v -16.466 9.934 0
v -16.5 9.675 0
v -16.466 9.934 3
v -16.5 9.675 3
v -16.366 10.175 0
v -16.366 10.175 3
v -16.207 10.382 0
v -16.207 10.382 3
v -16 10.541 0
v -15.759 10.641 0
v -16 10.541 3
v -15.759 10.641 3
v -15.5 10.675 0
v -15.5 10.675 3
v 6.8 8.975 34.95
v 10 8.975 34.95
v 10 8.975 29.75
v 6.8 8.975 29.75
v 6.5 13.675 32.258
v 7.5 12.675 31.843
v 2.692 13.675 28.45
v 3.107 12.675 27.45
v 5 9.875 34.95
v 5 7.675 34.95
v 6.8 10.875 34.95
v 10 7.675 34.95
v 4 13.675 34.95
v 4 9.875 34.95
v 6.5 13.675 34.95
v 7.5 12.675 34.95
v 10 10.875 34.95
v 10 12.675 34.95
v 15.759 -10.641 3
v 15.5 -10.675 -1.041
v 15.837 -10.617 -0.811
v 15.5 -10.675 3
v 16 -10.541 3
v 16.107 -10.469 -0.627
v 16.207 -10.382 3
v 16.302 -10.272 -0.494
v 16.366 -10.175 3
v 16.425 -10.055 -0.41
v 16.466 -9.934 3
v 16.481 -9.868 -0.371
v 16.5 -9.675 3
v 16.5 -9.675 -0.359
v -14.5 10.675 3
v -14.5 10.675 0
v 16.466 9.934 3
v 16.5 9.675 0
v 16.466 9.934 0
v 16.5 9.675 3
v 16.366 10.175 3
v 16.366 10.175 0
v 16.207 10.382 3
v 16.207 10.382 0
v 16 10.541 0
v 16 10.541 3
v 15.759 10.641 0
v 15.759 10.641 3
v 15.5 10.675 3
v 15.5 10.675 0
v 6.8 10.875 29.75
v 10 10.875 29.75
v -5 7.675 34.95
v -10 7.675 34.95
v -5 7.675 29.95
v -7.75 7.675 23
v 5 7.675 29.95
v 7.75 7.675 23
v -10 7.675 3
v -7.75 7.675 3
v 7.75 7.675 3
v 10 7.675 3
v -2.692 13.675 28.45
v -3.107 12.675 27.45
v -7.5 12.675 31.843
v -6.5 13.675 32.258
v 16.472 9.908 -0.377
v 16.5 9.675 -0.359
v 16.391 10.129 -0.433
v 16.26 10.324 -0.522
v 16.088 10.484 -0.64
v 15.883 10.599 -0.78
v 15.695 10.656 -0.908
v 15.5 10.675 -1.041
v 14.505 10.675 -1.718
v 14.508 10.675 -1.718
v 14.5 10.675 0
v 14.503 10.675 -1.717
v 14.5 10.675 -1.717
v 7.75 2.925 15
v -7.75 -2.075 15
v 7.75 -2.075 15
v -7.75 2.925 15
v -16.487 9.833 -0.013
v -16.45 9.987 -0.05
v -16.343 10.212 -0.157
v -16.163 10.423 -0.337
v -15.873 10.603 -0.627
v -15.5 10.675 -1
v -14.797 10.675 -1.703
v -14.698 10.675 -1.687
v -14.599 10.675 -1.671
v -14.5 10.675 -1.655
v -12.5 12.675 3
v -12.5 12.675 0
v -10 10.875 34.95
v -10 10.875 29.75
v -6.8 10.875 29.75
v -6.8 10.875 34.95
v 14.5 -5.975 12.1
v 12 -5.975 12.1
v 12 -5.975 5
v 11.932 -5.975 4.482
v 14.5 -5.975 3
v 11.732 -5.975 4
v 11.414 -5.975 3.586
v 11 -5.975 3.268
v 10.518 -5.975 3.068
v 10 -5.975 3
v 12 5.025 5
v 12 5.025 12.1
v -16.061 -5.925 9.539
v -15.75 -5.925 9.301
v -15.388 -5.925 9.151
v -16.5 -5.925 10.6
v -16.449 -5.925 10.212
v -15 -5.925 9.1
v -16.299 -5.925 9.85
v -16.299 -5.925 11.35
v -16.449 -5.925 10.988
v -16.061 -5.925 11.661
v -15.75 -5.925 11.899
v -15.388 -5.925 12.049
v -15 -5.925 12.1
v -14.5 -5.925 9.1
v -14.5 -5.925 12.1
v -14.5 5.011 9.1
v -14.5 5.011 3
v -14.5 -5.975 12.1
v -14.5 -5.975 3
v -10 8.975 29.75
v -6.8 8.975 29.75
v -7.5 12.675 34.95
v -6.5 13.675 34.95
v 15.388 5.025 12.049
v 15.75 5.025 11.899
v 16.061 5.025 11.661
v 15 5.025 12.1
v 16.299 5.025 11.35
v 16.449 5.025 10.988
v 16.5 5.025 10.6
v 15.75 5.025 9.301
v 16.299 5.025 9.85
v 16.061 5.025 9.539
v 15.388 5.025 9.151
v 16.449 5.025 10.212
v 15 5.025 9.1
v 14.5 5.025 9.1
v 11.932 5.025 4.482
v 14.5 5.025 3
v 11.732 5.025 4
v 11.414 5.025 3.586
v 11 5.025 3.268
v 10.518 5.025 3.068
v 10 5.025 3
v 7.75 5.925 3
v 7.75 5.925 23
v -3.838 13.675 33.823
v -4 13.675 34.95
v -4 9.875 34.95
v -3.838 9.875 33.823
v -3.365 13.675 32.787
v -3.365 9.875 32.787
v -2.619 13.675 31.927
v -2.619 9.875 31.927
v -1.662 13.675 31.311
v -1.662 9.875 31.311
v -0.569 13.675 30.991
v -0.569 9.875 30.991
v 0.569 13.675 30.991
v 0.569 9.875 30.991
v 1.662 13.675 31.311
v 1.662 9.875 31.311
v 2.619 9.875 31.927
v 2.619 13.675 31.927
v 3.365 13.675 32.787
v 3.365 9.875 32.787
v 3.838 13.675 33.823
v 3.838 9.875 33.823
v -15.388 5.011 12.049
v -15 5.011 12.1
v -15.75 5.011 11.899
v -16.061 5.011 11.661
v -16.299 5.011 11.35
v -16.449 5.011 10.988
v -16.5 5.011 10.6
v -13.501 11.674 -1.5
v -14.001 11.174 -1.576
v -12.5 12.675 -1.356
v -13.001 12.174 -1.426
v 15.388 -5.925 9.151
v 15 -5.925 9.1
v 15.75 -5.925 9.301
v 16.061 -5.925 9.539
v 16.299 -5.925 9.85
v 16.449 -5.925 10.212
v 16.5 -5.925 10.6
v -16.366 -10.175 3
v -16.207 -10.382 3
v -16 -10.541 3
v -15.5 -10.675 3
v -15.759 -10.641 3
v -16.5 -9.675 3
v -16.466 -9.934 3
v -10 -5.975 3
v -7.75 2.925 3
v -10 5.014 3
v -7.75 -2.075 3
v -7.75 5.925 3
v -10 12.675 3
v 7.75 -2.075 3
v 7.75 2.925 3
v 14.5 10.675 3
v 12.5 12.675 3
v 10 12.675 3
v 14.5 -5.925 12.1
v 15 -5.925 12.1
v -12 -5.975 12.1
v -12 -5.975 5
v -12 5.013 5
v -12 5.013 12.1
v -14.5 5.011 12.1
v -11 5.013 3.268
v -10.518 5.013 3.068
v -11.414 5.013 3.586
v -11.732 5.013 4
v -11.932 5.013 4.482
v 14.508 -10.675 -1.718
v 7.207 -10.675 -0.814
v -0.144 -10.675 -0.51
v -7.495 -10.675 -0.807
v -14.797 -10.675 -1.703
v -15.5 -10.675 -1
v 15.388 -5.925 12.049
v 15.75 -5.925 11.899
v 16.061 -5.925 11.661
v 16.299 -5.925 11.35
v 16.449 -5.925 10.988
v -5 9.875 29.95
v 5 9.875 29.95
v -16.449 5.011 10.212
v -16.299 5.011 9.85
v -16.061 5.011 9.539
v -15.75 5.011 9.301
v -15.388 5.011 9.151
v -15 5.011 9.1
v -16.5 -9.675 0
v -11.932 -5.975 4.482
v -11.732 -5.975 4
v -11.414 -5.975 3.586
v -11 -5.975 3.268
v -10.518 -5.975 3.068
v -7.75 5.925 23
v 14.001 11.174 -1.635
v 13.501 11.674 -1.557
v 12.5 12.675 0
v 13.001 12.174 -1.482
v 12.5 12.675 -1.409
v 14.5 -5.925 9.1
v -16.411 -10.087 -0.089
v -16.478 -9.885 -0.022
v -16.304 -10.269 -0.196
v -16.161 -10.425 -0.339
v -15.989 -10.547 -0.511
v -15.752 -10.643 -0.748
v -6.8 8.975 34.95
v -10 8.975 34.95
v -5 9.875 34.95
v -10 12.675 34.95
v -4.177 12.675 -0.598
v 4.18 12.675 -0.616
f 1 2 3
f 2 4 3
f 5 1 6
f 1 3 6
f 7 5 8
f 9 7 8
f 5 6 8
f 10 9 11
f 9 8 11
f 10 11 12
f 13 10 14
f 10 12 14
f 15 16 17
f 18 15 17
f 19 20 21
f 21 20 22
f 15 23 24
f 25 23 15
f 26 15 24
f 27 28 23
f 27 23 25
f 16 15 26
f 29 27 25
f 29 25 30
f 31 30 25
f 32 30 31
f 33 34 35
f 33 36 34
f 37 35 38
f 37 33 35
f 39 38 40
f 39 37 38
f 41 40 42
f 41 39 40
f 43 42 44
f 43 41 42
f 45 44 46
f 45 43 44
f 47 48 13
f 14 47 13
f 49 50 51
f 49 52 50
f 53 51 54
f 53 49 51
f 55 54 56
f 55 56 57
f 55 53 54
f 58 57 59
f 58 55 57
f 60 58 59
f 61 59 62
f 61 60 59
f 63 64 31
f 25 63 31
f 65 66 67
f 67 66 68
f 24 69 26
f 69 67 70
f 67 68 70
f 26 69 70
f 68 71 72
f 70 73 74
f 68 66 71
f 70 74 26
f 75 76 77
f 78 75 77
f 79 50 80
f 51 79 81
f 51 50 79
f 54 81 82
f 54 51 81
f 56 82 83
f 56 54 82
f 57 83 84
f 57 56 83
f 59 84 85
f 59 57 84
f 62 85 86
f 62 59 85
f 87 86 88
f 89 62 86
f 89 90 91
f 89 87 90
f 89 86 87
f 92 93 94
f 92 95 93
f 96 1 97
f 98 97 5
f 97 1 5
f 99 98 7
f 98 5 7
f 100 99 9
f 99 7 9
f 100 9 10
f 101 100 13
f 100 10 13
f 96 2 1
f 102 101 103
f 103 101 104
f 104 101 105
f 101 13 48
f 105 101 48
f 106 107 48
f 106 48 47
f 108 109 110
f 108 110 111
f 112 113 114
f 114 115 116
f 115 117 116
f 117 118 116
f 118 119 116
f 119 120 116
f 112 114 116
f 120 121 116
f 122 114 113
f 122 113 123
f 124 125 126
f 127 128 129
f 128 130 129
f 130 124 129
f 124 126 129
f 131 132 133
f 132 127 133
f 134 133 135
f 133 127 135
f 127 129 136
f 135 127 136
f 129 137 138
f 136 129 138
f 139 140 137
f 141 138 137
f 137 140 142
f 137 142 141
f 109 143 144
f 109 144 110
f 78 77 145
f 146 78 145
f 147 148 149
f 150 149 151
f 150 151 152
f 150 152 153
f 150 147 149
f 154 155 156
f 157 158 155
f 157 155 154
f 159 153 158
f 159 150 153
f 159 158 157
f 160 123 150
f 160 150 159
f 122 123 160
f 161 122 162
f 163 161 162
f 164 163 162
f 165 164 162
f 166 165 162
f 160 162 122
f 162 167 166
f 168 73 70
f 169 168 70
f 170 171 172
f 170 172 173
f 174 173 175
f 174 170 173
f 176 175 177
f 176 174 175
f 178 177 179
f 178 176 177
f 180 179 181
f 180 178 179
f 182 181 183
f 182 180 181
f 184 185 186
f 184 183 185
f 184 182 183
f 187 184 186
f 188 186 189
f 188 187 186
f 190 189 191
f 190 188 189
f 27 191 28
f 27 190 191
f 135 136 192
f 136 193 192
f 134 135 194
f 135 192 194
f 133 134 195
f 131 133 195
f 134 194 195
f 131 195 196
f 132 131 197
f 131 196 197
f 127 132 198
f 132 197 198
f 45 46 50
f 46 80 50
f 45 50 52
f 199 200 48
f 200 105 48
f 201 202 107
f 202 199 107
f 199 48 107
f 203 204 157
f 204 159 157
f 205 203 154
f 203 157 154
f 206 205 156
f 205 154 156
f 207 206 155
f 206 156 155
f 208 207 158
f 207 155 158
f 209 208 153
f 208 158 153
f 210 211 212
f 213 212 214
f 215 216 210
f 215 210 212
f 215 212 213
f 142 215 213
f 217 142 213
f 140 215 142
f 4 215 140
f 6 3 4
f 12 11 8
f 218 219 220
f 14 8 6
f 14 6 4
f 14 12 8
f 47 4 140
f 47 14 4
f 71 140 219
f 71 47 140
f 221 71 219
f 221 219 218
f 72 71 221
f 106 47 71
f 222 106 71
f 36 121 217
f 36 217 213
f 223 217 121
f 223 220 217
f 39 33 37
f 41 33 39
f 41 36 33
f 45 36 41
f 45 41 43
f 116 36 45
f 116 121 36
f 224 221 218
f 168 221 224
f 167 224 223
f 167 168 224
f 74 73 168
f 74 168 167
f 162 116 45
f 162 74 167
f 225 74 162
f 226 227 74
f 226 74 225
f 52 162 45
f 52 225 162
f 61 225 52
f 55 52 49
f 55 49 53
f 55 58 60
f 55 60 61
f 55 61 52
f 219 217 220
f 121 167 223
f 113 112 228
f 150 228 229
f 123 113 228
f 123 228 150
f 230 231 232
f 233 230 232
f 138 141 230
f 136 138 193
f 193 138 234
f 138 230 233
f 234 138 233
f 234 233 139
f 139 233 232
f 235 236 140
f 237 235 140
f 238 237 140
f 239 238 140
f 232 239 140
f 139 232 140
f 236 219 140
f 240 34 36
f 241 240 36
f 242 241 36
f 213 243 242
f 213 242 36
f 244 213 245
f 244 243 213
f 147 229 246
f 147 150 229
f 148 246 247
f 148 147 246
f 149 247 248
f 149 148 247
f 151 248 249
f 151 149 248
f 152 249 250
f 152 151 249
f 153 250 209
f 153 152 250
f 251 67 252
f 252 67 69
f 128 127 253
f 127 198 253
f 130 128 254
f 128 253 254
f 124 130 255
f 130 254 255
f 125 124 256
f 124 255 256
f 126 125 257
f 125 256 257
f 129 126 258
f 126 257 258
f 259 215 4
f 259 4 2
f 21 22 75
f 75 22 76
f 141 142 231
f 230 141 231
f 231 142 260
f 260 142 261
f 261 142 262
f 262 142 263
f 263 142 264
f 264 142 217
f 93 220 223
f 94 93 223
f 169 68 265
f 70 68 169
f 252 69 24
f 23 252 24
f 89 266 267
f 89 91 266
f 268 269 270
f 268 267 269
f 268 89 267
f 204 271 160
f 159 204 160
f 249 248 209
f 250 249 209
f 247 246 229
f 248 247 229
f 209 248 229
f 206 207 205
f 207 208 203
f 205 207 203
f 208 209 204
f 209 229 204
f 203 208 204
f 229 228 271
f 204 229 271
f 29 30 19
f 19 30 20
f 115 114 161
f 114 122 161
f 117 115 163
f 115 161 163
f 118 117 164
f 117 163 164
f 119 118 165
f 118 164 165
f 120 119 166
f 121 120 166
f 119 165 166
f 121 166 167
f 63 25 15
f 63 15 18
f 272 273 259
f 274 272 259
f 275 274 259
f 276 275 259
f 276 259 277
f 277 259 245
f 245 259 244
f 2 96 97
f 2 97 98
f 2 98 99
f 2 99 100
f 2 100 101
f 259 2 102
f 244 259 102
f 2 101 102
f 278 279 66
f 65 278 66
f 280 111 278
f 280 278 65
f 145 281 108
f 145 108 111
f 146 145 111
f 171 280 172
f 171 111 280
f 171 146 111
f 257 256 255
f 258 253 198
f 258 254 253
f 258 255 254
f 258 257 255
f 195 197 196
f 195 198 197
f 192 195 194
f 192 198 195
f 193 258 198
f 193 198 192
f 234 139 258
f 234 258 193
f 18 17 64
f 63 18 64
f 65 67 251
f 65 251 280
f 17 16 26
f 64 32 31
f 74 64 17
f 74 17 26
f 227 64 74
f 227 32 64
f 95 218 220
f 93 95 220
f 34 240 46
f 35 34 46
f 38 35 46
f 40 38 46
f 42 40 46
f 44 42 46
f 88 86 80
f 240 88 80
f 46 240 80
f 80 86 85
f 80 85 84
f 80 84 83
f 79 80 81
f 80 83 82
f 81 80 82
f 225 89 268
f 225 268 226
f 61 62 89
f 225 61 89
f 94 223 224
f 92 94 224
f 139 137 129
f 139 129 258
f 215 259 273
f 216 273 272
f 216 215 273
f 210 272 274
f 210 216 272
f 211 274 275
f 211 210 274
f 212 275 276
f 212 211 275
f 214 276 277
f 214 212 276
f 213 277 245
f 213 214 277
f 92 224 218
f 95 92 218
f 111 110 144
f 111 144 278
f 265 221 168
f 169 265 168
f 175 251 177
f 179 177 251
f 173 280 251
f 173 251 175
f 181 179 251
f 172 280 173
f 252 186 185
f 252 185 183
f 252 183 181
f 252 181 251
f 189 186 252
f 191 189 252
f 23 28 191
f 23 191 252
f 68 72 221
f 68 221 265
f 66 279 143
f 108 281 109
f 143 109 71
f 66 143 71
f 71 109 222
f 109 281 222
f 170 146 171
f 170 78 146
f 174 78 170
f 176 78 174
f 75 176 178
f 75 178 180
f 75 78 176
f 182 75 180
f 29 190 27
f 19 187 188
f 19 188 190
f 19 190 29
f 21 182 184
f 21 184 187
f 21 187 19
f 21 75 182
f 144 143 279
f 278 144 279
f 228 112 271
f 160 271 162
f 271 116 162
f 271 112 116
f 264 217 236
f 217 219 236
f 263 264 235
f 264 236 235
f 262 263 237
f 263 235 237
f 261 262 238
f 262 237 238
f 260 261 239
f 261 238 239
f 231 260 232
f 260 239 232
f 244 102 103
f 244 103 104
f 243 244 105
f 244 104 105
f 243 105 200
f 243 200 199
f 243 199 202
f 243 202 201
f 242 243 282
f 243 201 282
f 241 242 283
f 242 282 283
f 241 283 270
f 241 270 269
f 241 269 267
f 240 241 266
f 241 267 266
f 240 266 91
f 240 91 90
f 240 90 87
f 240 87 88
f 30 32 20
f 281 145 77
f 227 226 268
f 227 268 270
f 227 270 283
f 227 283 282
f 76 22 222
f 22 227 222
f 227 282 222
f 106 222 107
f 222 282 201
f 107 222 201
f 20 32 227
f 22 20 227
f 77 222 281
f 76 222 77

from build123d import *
from build123d.topology import SkipClean

# Parameters (mm, degrees)
BOSS_EXTRUDE1_DEPTH = 3
SKETCH2_W           = 2.5
SKETCH2_H           = 11
BOSS_EXTRUDE2_DEPTH = 9.1
SKETCH3_W           = 3
SKETCH3_H           = 10.936372413
BOSS_EXTRUDE3_DEPTH = 2
SKETCH4_W           = 3
SKETCH4_H           = 10.95
BOSS_EXTRUDE4_DEPTH = 2
FILLET2_R           = 1.5
FILLET3_R           = 2
SKETCH6_W           = 20
SKETCH6_H           = 31.95
BOSS_EXTRUDE5_DEPTH = 5
CUT_EXTRUDE1_REACH  = 47.155
BOSS_EXTRUDE6_START = 1
BOSS_EXTRUDE6_DEPTH = 1
CHAMFER1_SIZE       = 1
SKETCH10_W          = 15.5
SKETCH10_H          = 20
BOSS_EXTRUDE7_DEPTH = 1.75
BOSS_EXTRUDE8_DEPTH = 12
BOSS_EXTRUDE9_DEPTH = 23.35
CHAMFER3_SIZE       = 1.7121869
CHAMFER3_SIZE_2     = 2
FILLET4_R           = 1
CHAMFER4_SIZE       = 2
CUT_EXTRUDE2_DEPTH  = 41.997050199
CUT_EXTRUDE3_DEPTH  = 3.2
SKETCH15_W          = 5.2
SKETCH15_H          = 1.9
CUT_EXTRUDE4_DEPTH  = 3.2
SKETCH16_W          = 10
SKETCH16_H          = 5
CUT_EXTRUDE5_DEPTH  = 2.2


# Some blends are built 0.0001 mm under size
with BuildPart() as part:
    # Sketch1 → Boss-Extrude1 (new body)
    with BuildSketch(Plane.XY):
        Polygon((14.5, 12.675), (-14.5, 12.675), (-14.5, 10.675), (-16.5, 10.675), (-16.5, -10.675), (16.5, -10.675), (16.5, 10.675), (14.5, 10.675), align=None)
    extrude(amount=BOSS_EXTRUDE1_DEPTH)

    # Sketch2 → Boss-Extrude2 (add)
    with BuildSketch(Plane.XY.offset(3)):
        with Locations((13.25, -0.475)):
            Rectangle(SKETCH2_W, SKETCH2_H)
        Polygon((-14.5, 5.011372413), (-14.5, -5.975), (-12, -5.975), (-12, 5.012658035), align=None)
    extrude(amount=BOSS_EXTRUDE2_DEPTH)

    # Sketch3 → Boss-Extrude3 (add)
    with BuildSketch(Plane.ZY.offset(14.5)):
        with Locations((10.6, -0.456813794)):
            Rectangle(SKETCH3_W, SKETCH3_H)
    extrude(amount=BOSS_EXTRUDE3_DEPTH)

    # Sketch4 → Boss-Extrude4 (add)
    with BuildSketch(Plane(origin=(14.5, 0, 0), x_dir=(0, 0, -1), z_dir=(1, 0, 0))):
        with Locations((-10.6, -0.45)):
            Rectangle(SKETCH4_W, SKETCH4_H)
    extrude(amount=BOSS_EXTRUDE4_DEPTH)

    # Fillet2
    fillet2_edges = [part.edges().sort_by_distance(p)[0] for p in [
        (-16.5, -0.456813793, 9.1),
        (-16.5, -0.456813793, 12.1),
        (16.5, -0.45, 9.1),
        (16.5, -0.45, 12.1),
    ]]
    fillet(fillet2_edges, radius=FILLET2_R - 0.0001)  # a hair under: the kernel refuses the full size

    # Fillet3
    fillet3_edges = [part.edges().sort_by_distance(p)[0] for p in [
        (12, -0.475, 3),
        (-12, -0.481170983, 3),
    ]]
    fillet(fillet3_edges, radius=FILLET3_R)

    # Sketch6 → Boss-Extrude5 (add)
    with BuildSketch(Plane(origin=(0, 12.675, 0), x_dir=(1, 0, 0), z_dir=(0, 1, 0))):
        with Locations((0, -18.975)):
            Rectangle(SKETCH6_W, SKETCH6_H)
    extrude(amount=-BOSS_EXTRUDE5_DEPTH)

    # Sketch7 → Cut-Extrude1 (cut, up to next)
    with BuildSketch(Plane(origin=(0, 12.675, 0), x_dir=(1, 0, 0), z_dir=(0, 1, 0)), mode=Mode.PRIVATE) as cut_extrude1_sk1:
        with BuildLine():
            Line((-4, -34.95), (4, -34.95))
            ThreePointArc((4, -34.95), (0, -30.95), (-4, -34.95))
        make_face()
    cut_extrude1_tool1 = extrude(cut_extrude1_sk1.sketch, amount=-CUT_EXTRUDE1_REACH, mode=Mode.PRIVATE) & part.part
    add(cut_extrude1_tool1.solids().sort_by_distance((0, 12.675, 33.252347))[0], mode=Mode.SUBTRACT)

    # Sketch8 → Boss-Extrude6 (add)
    with BuildSketch(Plane(origin=(0, 12.675, 0), x_dir=(1, 0, 0), z_dir=(0, 1, 0)).offset(BOSS_EXTRUDE6_START)):
        with BuildLine():
            Line((-7.5, -34.95), (-4, -34.95))
            ThreePointArc((-4, -34.95), (0, -30.95), (4, -34.95))
            Line((4, -34.95), (7.5, -34.95))
            Line((7.5, -34.95), (7.5, -31.843398282))
            Line((7.5, -31.843398282), (3.106601718, -27.45))
            Line((3.106601718, -27.45), (-3.106601718, -27.45))
            Line((-3.106601718, -27.45), (-7.5, -31.843398282))
            Line((-7.5, -31.843398282), (-7.5, -34.95))
        make_face()
    extrude(amount=-BOSS_EXTRUDE6_DEPTH)

    # Chamfer1
    chamfer1_edges = [part.edges().sort_by_distance(p)[0] for p in [
        (-7.5, 13.675, 33.396699141),
        (-5.303300859, 13.675, 29.646699141),
        (0, 13.675, 27.45),
        (5.303300859, 13.675, 29.646699141),
        (7.5, 13.675, 33.396699141),
    ]]
    chamfer(chamfer1_edges, length=CHAMFER1_SIZE - 0.0001)  # a hair under: the kernel refuses the full size

    # Sketch10 → Boss-Extrude7 (add)
    with BuildSketch(Plane.XZ.offset(-7.675)):
        with Locations((0, 13)):
            Rectangle(SKETCH10_W, SKETCH10_H)
    extrude(amount=BOSS_EXTRUDE7_DEPTH)

    # Sketch11 → Boss-Extrude8 (add)
    with BuildSketch(Plane.XY.offset(3)):
        Polygon((-7.75, 1.425), (-7.75, -2.075), (7.75, -2.075), (7.75, 1.425), (7.75, 2.925), (-7.75, 2.925), align=None)
    extrude(amount=BOSS_EXTRUDE8_DEPTH)

    # Sketch12 → Boss-Extrude9 (add, through all)
    with BuildSketch(Plane(origin=(0, 12.675, 0), x_dir=(1, 0, 0), z_dir=(0, 1, 0))):
        with BuildLine():
            Line((-16.5, 0), (-16.5, 2))
            ThreePointArc((-16.5, 2), (0.003271262, 0.509953036), (16.5, 2.070767971))
            Line((16.5, 2.070767971), (16.5, 0))
            Line((16.5, 0), (-16.5, 0))
        make_face()
    extrude(amount=-BOSS_EXTRUDE9_DEPTH)

    # Chamfer3
    # the kernel refuses this chamfer: 2, 1.717229303, 1.7121869 mm, written as the material it takes off along each edge
    with BuildSketch(Plane(origin=(16.5, 17.877033417, -2.070767971), x_dir=(-0.98467727082698, 0, 0.1743865600232151), z_dir=(0, -1, 0))) as chamfer3_piece_1:
        with BuildLine():
            Line((2.022860888, 0), (CHAMFER3_SIZE * 0.174386559999, -CHAMFER3_SIZE * 0.984677270689))
            Line((CHAMFER3_SIZE * 0.174386559999, -CHAMFER3_SIZE * 0.984677270689), (0, 0))
            ThreePointArc((0, 0), (1.040041486, -0.005678918), (2.022860888, 0))
        make_face()
    extrude(amount=33.754066833, mode=Mode.SUBTRACT)
    with BuildSketch(Plane(origin=(-16.5, 17.818365976, -2), x_dir=(0, 0, 1), z_dir=(0, -1, 0))) as chamfer3_piece_2:
        with BuildLine():
            Line((CHAMFER3_SIZE_2, 0), (0.296949553, -1.703050447))
            ThreePointArc((0.296949553, -1.703050447), (0.156514359, -0.873485517), (0, 0))
            Line((0, 0), (CHAMFER3_SIZE_2, 0))
        make_face()
    extrude(amount=33.636731952, mode=Mode.SUBTRACT)

    # Fillet4
    fillet4_edges = [part.edges().sort_by_distance(p)[0] for p in [
        (16.5, 10.675, 1.5),
        (16.5, -10.675, 1.320709464),
        (-16.5, -10.675, 1.5),
        (-16.5, 10.675, 1.5),
    ]]
    fillet(fillet4_edges, radius=FILLET4_R)

    # Chamfer4
    chamfer4_edges = [part.edges().sort_by_distance(p)[0] for p in [
        (-14.5, 12.675, 1.5),
        (14.5, 12.675, 1.5),
    ]]
    chamfer(chamfer4_edges, length=CHAMFER4_SIZE - 0.0001)  # a hair under: the kernel refuses the full size

    # Sketch13 → Cut-Extrude2 (cut, through all)
    with SkipClean():  # the faces are left unmerged after this step: merging them gives an invalid solid
        with BuildSketch(Plane.XY):
            with BuildLine():
                Line((12.5, 12.675), (16.5, 12.675))
                Line((16.5, 12.675), (16.5, 9.675))
                ThreePointArc((16.5, 9.675), (16.207106781, 10.382106781), (15.5, 10.675))
                Line((15.5, 10.675), (14.5, 10.675))
                Line((14.5, 10.675), (12.5, 12.675))
            make_face()
            with BuildLine():
                Line((-12.5, 12.675), (-16.5, 12.675))
                Line((-16.5, 12.675), (-16.5, 9.675))
                ThreePointArc((-16.5, 9.675), (-16.207106781, 10.382106781), (-15.5, 10.675))
                Line((-15.5, 10.675), (-14.5, 10.675))
                Line((-14.5, 10.675), (-12.5, 12.675))
            make_face()
        extrude(amount=-CUT_EXTRUDE2_DEPTH, mode=Mode.SUBTRACT)

    # Sketch14 → Cut-Extrude3 (cut)
    with SkipClean():  # the faces are left unmerged after this step: merging them gives an invalid solid
        with BuildSketch(Plane(origin=(10, 0, 0), x_dir=(0, 0, -1), z_dir=(1, 0, 0))):
            Polygon((-34.95, 10.875), (-34.95, 8.975), (-29.75, 8.975), (-29.75, 9.175), (-29.75, 10.675), (-29.75, 10.875), align=None)
        extrude(amount=-CUT_EXTRUDE3_DEPTH, mode=Mode.SUBTRACT)

    # Sketch15 → Cut-Extrude4 (cut)
    with SkipClean():  # the faces are left unmerged after this step: merging them gives an invalid solid
        with BuildSketch(Plane.ZY.offset(10)):
            with Locations((32.35, 9.925)):
                Rectangle(SKETCH15_W, SKETCH15_H)
        extrude(amount=-CUT_EXTRUDE4_DEPTH, mode=Mode.SUBTRACT)

    # Sketch16 → Cut-Extrude5 (cut)
    with SkipClean():  # the faces are left unmerged after this step: merging them gives an invalid solid
        with BuildSketch(Plane.XZ.offset(-7.675)):
            with Locations((0, 32.45)):
                Rectangle(SKETCH16_W, SKETCH16_H)
        extrude(amount=-CUT_EXTRUDE5_DEPTH, mode=Mode.SUBTRACT)


solid = part.part
